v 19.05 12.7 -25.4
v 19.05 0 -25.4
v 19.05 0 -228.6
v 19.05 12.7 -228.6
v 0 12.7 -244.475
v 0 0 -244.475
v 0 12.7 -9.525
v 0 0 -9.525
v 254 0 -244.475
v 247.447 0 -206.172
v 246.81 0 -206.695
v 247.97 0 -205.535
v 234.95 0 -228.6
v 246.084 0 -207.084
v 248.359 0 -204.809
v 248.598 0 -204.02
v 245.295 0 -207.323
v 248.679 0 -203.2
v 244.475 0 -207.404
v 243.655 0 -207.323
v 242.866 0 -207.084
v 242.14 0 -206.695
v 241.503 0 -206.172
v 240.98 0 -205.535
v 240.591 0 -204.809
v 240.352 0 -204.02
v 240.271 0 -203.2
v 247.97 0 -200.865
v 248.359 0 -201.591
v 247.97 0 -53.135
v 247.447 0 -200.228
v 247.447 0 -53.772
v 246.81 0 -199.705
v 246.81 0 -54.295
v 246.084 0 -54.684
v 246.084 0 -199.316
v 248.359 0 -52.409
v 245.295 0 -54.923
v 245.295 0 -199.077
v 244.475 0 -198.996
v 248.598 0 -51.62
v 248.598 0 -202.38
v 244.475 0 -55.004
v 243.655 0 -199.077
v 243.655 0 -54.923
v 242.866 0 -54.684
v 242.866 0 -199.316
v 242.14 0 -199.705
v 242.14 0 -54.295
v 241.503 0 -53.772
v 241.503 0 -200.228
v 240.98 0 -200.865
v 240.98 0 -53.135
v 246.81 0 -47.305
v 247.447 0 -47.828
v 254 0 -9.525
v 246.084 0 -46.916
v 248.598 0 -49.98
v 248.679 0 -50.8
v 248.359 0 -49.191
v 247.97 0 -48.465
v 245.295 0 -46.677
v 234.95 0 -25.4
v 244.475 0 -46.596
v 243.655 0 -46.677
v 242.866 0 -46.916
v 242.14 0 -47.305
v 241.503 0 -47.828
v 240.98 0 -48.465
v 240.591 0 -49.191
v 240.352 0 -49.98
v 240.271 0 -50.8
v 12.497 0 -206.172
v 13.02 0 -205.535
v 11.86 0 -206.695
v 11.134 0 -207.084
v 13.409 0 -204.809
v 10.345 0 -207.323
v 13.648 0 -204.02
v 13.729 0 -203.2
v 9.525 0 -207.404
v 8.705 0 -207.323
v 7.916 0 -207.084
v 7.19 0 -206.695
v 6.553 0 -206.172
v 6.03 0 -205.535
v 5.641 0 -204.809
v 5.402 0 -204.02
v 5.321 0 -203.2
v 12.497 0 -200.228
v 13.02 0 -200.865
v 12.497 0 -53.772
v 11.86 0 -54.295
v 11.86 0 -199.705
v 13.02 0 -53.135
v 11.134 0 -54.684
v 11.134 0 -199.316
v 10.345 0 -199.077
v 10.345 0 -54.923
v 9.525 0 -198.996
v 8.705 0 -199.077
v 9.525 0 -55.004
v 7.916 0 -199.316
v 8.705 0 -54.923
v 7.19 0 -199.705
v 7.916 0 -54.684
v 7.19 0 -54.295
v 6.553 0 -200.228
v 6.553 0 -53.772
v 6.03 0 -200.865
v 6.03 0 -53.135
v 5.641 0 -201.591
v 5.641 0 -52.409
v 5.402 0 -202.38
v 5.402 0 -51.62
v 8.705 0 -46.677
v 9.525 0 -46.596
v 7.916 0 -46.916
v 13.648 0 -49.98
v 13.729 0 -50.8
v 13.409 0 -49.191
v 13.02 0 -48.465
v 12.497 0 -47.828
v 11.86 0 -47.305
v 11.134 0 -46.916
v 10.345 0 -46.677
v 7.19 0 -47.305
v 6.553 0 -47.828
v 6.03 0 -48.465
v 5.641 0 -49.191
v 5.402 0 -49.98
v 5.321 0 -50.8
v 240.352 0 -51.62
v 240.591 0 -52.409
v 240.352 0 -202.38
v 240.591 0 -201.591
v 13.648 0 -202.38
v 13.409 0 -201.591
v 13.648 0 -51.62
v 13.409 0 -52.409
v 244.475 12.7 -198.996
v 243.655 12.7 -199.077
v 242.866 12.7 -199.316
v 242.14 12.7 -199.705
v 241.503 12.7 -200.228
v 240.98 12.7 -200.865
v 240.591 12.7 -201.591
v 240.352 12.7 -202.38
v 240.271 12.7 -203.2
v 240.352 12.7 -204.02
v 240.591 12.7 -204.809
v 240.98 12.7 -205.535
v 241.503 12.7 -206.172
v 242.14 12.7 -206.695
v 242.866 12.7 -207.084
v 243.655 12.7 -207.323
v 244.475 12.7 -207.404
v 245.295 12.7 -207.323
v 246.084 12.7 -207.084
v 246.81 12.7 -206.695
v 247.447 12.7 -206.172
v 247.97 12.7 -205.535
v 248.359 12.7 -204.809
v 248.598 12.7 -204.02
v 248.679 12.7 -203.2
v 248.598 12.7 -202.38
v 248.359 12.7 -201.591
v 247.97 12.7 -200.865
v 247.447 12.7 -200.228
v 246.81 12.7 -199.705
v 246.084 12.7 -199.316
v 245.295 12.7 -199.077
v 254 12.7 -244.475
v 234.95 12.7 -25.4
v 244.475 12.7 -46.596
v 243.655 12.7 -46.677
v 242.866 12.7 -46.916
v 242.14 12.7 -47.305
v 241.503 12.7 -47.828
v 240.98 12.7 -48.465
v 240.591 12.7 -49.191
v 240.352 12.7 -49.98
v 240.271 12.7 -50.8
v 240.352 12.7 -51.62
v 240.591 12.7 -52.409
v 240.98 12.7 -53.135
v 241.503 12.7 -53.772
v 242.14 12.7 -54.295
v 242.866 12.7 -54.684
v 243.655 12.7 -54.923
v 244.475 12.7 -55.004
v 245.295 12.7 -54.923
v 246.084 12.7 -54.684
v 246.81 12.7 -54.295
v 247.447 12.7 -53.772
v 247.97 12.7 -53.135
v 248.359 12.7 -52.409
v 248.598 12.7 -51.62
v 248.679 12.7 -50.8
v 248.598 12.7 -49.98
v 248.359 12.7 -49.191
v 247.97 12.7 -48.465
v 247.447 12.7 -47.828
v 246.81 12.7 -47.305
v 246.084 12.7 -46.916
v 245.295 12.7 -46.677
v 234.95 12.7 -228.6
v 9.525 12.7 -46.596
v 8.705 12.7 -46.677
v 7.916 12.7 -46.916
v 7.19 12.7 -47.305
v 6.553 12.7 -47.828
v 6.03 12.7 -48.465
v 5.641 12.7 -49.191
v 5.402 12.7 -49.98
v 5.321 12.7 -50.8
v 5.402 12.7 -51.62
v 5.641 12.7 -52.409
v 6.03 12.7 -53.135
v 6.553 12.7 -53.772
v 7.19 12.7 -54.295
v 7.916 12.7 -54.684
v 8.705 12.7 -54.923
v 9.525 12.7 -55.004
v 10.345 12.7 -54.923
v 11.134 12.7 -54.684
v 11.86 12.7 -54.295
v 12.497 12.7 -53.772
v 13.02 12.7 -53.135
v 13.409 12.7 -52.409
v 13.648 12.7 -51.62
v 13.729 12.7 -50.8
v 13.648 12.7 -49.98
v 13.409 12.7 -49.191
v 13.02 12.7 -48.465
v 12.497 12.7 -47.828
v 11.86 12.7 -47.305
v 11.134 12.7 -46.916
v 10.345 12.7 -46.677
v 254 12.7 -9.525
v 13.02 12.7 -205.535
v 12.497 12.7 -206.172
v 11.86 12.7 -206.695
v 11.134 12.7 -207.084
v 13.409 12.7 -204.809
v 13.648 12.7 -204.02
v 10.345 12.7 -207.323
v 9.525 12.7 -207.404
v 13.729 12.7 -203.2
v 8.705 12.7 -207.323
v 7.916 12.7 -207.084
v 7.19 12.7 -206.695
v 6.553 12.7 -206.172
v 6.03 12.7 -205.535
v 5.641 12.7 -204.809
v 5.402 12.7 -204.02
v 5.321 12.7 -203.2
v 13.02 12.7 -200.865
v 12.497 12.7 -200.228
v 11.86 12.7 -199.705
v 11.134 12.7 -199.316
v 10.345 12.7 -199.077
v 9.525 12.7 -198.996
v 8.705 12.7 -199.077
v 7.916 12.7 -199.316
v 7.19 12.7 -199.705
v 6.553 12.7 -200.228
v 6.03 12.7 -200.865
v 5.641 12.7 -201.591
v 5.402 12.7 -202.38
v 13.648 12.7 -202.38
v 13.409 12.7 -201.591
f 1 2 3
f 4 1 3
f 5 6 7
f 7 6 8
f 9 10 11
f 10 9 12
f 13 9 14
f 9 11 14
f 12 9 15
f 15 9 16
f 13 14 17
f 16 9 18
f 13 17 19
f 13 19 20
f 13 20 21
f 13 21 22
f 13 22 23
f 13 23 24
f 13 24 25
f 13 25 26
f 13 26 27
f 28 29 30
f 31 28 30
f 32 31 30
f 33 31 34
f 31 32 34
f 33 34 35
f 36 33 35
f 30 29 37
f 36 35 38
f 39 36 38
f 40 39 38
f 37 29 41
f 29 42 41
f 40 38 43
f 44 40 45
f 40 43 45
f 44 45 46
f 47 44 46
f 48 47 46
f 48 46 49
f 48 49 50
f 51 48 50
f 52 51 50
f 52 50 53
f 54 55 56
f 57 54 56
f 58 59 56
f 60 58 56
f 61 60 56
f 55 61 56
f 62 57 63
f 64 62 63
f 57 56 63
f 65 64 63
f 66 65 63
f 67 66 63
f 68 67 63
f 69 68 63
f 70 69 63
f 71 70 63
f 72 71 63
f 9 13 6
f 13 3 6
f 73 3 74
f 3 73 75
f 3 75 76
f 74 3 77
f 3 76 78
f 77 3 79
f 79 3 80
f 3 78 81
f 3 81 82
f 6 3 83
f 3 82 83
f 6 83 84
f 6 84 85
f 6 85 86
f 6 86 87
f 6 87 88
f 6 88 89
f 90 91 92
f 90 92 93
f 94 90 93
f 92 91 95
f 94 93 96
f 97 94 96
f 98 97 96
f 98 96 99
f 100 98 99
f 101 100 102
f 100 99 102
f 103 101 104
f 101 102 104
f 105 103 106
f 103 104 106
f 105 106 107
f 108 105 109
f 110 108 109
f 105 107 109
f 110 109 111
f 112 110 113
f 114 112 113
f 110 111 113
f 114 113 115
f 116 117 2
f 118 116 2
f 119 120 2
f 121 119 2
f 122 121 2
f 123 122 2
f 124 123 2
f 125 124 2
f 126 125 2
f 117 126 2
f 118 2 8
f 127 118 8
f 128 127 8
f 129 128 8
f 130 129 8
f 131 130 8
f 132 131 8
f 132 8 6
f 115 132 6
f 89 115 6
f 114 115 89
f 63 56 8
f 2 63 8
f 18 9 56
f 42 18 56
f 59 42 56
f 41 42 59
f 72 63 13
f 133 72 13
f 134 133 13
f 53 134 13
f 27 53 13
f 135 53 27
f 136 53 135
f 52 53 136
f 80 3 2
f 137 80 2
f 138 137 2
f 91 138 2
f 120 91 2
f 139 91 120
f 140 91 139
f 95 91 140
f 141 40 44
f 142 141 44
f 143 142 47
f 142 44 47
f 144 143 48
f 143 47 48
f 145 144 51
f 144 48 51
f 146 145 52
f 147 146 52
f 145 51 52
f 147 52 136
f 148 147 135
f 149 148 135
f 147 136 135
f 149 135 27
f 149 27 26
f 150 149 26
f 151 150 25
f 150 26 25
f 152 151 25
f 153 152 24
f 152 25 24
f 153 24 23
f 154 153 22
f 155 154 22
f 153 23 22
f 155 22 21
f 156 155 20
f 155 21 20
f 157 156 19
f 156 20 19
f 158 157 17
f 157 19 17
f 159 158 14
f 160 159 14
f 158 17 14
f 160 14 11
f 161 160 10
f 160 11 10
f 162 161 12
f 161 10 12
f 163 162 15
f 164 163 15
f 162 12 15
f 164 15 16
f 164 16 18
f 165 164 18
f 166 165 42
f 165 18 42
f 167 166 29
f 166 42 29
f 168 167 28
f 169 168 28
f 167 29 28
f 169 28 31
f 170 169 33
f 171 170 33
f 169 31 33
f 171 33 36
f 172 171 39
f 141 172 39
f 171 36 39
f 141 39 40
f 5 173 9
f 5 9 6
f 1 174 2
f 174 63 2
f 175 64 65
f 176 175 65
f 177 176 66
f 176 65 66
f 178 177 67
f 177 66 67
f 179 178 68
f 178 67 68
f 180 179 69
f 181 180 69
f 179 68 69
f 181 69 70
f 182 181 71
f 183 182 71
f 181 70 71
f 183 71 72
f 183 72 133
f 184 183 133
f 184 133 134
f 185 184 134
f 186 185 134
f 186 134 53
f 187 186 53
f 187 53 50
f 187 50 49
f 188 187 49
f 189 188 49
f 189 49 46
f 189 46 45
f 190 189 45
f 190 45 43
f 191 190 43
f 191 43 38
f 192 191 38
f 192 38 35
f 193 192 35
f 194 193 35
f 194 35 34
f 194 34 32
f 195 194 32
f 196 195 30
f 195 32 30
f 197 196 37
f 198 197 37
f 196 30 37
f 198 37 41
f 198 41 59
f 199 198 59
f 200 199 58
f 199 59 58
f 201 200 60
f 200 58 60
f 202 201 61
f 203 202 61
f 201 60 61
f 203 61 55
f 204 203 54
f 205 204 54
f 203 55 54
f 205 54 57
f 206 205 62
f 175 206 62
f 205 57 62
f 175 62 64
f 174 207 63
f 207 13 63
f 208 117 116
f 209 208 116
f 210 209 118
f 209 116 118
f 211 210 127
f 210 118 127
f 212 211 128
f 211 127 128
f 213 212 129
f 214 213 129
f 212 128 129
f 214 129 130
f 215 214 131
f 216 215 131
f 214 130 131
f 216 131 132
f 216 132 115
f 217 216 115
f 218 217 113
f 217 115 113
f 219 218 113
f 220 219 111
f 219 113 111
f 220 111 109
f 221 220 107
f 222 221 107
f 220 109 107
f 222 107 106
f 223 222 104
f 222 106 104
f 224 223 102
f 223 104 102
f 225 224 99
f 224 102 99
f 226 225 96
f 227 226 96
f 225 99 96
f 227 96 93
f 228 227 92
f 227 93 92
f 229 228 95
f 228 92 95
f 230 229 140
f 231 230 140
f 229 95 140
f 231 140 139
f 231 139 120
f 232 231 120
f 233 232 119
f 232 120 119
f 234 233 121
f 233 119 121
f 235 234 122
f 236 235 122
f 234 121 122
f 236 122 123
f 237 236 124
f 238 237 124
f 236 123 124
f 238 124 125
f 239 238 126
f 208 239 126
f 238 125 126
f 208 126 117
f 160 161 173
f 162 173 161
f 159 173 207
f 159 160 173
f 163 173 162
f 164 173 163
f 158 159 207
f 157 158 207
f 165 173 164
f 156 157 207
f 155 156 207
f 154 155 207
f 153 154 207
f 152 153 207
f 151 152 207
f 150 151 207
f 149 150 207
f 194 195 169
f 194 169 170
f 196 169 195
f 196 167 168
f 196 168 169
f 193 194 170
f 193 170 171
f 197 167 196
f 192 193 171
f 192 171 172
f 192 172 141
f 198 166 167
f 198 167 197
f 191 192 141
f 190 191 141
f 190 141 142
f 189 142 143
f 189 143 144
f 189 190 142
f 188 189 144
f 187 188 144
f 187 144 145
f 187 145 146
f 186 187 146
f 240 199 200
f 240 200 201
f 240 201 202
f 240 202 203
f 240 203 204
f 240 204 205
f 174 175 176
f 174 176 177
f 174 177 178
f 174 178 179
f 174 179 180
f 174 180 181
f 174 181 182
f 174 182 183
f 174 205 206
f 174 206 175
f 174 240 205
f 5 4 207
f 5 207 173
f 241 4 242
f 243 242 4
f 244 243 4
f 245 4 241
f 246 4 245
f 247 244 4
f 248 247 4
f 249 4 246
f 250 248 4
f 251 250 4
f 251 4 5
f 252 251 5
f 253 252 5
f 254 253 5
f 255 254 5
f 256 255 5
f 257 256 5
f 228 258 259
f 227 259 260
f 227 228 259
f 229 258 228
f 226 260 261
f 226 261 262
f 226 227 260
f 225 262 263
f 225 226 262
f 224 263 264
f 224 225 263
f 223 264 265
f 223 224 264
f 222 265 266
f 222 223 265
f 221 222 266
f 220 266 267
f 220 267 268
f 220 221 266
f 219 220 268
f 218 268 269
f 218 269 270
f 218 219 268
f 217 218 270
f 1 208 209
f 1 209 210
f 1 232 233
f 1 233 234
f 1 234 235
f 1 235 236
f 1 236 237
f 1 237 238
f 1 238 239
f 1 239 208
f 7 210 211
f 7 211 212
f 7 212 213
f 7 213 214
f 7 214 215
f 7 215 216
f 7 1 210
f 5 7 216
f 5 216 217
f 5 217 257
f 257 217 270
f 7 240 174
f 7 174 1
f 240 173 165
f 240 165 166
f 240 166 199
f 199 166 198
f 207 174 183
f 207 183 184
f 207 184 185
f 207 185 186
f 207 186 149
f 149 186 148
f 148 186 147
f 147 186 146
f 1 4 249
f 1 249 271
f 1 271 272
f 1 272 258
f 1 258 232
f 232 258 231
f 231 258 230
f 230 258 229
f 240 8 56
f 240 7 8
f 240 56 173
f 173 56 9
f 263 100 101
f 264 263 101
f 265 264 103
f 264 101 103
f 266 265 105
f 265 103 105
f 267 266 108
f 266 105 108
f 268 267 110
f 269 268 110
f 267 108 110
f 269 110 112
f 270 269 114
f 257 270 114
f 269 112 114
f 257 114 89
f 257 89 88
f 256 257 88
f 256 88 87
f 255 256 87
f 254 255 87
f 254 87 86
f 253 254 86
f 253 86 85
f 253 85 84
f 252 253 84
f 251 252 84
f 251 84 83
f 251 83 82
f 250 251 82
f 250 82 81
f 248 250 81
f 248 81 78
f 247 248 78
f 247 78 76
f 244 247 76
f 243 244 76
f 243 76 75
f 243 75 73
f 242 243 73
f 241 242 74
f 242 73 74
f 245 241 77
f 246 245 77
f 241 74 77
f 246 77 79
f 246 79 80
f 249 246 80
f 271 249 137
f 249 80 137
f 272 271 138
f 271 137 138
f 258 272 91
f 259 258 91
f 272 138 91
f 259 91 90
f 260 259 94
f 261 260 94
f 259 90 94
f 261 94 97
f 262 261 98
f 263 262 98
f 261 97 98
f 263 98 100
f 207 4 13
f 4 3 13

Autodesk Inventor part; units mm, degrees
ref_plane "YZ Plane" through (0, 0, 0) normal (1, 0, 0) x (0, 1, 0)
ref_plane "XZ Plane" through (0, 0, 0) normal (0, 1, 0) x (-1, 0, 0)
ref_plane "XY Plane" through (0, 0, 0) normal (0, 0, 1) x (1, 0, 0)
sketch "Sketch1" plane through (0, 0, 0) normal (0, 1, 0) x (-1, 0, 0)
  line L0 (0, 0) -> (-254, 0)
  line L1 (-254, 0) -> (-254, -254)
  line L2 (-254, -254) -> (0, -254)
  line L3 (0, -254) -> (0, 0)
  line L4 (-19.05, -228.6) -> (-234.95, -228.6)
  line L5 (-234.95, -228.6) -> (-234.95, -25.4)
  line L6 (-234.95, -25.4) -> (-19.05, -25.4)
  line L7 (-19.05, -25.4) -> (-19.05, -228.6)
  point P0 (-127, -228.6)
  point P1 (-127, -254)
  point P2 (-234.95, -127)
  point P3 (-254, -127)
  dimension "d0" = 254
  dimension "d1" = 254
  dimension "d2" = 25.4
  dimension "d3" = 19.05
extrude "Extrusion1" add sketch "Sketch1" along normal blind 12.7
sketch "Sketch2" plane through (0, 12.7, 0) normal (0, 1, 0) x (1, 0, 0)
  line L0 (0, 254) -> (0, 0) projected
  line L1 (254, 0) -> (254, 254) projected
  line L2 (19.05, 228.6) -> (234.95, 228.6) projected
  line L3 (234.95, 25.4) -> (19.05, 25.4) projected
  point P0 (9.525, 50.8)
  point P1 (9.525, 203.2)
  point P2 (244.475, 203.2)
  point P3 (244.475, 50.8)
  dimension "d6" = 9.525
  dimension "d7" = 9.525
  dimension "d8" = 25.4
  dimension "d9" = 25.4
hole "Hole1" at (9.525, 12.7, -50.8) at (9.525, 12.7, -203.2) at (244.475, 12.7, -203.2) at (244.475, 12.7, -50.8) direction (0, -1, 0) diameter 8.4074 end through all clearance for "Countersunk Flat Head Screw ISO 2009/7046" size "M8" standard "ISO"
sketch "Sketch3" plane through (0, 12.7, 0) normal (0, 1, 0) x (1, 0, 0)
  line L0 (254, 244.475) -> (0, 244.475) projected
  line L1 (254, 244.475) -> (254, 254) projected
  line L2 (0, 254) -> (254, 254) projected
  line L3 (0, 244.475) -> (0, 254) projected
  line L4 (0, 9.525) -> (254, 9.525) projected
  line L5 (0, 9.525) -> (0, 0) projected
  line L6 (254, 0) -> (0, 0) projected
  line L7 (254, 9.525) -> (254, 0) projected
extrude "Extrusion2" cut sketch "Sketch3" against normal through all
equation "\"d7\" = d6"
equation "\"d9\" = d8"
properties part number "Smooth Rod Brace Bottom"
